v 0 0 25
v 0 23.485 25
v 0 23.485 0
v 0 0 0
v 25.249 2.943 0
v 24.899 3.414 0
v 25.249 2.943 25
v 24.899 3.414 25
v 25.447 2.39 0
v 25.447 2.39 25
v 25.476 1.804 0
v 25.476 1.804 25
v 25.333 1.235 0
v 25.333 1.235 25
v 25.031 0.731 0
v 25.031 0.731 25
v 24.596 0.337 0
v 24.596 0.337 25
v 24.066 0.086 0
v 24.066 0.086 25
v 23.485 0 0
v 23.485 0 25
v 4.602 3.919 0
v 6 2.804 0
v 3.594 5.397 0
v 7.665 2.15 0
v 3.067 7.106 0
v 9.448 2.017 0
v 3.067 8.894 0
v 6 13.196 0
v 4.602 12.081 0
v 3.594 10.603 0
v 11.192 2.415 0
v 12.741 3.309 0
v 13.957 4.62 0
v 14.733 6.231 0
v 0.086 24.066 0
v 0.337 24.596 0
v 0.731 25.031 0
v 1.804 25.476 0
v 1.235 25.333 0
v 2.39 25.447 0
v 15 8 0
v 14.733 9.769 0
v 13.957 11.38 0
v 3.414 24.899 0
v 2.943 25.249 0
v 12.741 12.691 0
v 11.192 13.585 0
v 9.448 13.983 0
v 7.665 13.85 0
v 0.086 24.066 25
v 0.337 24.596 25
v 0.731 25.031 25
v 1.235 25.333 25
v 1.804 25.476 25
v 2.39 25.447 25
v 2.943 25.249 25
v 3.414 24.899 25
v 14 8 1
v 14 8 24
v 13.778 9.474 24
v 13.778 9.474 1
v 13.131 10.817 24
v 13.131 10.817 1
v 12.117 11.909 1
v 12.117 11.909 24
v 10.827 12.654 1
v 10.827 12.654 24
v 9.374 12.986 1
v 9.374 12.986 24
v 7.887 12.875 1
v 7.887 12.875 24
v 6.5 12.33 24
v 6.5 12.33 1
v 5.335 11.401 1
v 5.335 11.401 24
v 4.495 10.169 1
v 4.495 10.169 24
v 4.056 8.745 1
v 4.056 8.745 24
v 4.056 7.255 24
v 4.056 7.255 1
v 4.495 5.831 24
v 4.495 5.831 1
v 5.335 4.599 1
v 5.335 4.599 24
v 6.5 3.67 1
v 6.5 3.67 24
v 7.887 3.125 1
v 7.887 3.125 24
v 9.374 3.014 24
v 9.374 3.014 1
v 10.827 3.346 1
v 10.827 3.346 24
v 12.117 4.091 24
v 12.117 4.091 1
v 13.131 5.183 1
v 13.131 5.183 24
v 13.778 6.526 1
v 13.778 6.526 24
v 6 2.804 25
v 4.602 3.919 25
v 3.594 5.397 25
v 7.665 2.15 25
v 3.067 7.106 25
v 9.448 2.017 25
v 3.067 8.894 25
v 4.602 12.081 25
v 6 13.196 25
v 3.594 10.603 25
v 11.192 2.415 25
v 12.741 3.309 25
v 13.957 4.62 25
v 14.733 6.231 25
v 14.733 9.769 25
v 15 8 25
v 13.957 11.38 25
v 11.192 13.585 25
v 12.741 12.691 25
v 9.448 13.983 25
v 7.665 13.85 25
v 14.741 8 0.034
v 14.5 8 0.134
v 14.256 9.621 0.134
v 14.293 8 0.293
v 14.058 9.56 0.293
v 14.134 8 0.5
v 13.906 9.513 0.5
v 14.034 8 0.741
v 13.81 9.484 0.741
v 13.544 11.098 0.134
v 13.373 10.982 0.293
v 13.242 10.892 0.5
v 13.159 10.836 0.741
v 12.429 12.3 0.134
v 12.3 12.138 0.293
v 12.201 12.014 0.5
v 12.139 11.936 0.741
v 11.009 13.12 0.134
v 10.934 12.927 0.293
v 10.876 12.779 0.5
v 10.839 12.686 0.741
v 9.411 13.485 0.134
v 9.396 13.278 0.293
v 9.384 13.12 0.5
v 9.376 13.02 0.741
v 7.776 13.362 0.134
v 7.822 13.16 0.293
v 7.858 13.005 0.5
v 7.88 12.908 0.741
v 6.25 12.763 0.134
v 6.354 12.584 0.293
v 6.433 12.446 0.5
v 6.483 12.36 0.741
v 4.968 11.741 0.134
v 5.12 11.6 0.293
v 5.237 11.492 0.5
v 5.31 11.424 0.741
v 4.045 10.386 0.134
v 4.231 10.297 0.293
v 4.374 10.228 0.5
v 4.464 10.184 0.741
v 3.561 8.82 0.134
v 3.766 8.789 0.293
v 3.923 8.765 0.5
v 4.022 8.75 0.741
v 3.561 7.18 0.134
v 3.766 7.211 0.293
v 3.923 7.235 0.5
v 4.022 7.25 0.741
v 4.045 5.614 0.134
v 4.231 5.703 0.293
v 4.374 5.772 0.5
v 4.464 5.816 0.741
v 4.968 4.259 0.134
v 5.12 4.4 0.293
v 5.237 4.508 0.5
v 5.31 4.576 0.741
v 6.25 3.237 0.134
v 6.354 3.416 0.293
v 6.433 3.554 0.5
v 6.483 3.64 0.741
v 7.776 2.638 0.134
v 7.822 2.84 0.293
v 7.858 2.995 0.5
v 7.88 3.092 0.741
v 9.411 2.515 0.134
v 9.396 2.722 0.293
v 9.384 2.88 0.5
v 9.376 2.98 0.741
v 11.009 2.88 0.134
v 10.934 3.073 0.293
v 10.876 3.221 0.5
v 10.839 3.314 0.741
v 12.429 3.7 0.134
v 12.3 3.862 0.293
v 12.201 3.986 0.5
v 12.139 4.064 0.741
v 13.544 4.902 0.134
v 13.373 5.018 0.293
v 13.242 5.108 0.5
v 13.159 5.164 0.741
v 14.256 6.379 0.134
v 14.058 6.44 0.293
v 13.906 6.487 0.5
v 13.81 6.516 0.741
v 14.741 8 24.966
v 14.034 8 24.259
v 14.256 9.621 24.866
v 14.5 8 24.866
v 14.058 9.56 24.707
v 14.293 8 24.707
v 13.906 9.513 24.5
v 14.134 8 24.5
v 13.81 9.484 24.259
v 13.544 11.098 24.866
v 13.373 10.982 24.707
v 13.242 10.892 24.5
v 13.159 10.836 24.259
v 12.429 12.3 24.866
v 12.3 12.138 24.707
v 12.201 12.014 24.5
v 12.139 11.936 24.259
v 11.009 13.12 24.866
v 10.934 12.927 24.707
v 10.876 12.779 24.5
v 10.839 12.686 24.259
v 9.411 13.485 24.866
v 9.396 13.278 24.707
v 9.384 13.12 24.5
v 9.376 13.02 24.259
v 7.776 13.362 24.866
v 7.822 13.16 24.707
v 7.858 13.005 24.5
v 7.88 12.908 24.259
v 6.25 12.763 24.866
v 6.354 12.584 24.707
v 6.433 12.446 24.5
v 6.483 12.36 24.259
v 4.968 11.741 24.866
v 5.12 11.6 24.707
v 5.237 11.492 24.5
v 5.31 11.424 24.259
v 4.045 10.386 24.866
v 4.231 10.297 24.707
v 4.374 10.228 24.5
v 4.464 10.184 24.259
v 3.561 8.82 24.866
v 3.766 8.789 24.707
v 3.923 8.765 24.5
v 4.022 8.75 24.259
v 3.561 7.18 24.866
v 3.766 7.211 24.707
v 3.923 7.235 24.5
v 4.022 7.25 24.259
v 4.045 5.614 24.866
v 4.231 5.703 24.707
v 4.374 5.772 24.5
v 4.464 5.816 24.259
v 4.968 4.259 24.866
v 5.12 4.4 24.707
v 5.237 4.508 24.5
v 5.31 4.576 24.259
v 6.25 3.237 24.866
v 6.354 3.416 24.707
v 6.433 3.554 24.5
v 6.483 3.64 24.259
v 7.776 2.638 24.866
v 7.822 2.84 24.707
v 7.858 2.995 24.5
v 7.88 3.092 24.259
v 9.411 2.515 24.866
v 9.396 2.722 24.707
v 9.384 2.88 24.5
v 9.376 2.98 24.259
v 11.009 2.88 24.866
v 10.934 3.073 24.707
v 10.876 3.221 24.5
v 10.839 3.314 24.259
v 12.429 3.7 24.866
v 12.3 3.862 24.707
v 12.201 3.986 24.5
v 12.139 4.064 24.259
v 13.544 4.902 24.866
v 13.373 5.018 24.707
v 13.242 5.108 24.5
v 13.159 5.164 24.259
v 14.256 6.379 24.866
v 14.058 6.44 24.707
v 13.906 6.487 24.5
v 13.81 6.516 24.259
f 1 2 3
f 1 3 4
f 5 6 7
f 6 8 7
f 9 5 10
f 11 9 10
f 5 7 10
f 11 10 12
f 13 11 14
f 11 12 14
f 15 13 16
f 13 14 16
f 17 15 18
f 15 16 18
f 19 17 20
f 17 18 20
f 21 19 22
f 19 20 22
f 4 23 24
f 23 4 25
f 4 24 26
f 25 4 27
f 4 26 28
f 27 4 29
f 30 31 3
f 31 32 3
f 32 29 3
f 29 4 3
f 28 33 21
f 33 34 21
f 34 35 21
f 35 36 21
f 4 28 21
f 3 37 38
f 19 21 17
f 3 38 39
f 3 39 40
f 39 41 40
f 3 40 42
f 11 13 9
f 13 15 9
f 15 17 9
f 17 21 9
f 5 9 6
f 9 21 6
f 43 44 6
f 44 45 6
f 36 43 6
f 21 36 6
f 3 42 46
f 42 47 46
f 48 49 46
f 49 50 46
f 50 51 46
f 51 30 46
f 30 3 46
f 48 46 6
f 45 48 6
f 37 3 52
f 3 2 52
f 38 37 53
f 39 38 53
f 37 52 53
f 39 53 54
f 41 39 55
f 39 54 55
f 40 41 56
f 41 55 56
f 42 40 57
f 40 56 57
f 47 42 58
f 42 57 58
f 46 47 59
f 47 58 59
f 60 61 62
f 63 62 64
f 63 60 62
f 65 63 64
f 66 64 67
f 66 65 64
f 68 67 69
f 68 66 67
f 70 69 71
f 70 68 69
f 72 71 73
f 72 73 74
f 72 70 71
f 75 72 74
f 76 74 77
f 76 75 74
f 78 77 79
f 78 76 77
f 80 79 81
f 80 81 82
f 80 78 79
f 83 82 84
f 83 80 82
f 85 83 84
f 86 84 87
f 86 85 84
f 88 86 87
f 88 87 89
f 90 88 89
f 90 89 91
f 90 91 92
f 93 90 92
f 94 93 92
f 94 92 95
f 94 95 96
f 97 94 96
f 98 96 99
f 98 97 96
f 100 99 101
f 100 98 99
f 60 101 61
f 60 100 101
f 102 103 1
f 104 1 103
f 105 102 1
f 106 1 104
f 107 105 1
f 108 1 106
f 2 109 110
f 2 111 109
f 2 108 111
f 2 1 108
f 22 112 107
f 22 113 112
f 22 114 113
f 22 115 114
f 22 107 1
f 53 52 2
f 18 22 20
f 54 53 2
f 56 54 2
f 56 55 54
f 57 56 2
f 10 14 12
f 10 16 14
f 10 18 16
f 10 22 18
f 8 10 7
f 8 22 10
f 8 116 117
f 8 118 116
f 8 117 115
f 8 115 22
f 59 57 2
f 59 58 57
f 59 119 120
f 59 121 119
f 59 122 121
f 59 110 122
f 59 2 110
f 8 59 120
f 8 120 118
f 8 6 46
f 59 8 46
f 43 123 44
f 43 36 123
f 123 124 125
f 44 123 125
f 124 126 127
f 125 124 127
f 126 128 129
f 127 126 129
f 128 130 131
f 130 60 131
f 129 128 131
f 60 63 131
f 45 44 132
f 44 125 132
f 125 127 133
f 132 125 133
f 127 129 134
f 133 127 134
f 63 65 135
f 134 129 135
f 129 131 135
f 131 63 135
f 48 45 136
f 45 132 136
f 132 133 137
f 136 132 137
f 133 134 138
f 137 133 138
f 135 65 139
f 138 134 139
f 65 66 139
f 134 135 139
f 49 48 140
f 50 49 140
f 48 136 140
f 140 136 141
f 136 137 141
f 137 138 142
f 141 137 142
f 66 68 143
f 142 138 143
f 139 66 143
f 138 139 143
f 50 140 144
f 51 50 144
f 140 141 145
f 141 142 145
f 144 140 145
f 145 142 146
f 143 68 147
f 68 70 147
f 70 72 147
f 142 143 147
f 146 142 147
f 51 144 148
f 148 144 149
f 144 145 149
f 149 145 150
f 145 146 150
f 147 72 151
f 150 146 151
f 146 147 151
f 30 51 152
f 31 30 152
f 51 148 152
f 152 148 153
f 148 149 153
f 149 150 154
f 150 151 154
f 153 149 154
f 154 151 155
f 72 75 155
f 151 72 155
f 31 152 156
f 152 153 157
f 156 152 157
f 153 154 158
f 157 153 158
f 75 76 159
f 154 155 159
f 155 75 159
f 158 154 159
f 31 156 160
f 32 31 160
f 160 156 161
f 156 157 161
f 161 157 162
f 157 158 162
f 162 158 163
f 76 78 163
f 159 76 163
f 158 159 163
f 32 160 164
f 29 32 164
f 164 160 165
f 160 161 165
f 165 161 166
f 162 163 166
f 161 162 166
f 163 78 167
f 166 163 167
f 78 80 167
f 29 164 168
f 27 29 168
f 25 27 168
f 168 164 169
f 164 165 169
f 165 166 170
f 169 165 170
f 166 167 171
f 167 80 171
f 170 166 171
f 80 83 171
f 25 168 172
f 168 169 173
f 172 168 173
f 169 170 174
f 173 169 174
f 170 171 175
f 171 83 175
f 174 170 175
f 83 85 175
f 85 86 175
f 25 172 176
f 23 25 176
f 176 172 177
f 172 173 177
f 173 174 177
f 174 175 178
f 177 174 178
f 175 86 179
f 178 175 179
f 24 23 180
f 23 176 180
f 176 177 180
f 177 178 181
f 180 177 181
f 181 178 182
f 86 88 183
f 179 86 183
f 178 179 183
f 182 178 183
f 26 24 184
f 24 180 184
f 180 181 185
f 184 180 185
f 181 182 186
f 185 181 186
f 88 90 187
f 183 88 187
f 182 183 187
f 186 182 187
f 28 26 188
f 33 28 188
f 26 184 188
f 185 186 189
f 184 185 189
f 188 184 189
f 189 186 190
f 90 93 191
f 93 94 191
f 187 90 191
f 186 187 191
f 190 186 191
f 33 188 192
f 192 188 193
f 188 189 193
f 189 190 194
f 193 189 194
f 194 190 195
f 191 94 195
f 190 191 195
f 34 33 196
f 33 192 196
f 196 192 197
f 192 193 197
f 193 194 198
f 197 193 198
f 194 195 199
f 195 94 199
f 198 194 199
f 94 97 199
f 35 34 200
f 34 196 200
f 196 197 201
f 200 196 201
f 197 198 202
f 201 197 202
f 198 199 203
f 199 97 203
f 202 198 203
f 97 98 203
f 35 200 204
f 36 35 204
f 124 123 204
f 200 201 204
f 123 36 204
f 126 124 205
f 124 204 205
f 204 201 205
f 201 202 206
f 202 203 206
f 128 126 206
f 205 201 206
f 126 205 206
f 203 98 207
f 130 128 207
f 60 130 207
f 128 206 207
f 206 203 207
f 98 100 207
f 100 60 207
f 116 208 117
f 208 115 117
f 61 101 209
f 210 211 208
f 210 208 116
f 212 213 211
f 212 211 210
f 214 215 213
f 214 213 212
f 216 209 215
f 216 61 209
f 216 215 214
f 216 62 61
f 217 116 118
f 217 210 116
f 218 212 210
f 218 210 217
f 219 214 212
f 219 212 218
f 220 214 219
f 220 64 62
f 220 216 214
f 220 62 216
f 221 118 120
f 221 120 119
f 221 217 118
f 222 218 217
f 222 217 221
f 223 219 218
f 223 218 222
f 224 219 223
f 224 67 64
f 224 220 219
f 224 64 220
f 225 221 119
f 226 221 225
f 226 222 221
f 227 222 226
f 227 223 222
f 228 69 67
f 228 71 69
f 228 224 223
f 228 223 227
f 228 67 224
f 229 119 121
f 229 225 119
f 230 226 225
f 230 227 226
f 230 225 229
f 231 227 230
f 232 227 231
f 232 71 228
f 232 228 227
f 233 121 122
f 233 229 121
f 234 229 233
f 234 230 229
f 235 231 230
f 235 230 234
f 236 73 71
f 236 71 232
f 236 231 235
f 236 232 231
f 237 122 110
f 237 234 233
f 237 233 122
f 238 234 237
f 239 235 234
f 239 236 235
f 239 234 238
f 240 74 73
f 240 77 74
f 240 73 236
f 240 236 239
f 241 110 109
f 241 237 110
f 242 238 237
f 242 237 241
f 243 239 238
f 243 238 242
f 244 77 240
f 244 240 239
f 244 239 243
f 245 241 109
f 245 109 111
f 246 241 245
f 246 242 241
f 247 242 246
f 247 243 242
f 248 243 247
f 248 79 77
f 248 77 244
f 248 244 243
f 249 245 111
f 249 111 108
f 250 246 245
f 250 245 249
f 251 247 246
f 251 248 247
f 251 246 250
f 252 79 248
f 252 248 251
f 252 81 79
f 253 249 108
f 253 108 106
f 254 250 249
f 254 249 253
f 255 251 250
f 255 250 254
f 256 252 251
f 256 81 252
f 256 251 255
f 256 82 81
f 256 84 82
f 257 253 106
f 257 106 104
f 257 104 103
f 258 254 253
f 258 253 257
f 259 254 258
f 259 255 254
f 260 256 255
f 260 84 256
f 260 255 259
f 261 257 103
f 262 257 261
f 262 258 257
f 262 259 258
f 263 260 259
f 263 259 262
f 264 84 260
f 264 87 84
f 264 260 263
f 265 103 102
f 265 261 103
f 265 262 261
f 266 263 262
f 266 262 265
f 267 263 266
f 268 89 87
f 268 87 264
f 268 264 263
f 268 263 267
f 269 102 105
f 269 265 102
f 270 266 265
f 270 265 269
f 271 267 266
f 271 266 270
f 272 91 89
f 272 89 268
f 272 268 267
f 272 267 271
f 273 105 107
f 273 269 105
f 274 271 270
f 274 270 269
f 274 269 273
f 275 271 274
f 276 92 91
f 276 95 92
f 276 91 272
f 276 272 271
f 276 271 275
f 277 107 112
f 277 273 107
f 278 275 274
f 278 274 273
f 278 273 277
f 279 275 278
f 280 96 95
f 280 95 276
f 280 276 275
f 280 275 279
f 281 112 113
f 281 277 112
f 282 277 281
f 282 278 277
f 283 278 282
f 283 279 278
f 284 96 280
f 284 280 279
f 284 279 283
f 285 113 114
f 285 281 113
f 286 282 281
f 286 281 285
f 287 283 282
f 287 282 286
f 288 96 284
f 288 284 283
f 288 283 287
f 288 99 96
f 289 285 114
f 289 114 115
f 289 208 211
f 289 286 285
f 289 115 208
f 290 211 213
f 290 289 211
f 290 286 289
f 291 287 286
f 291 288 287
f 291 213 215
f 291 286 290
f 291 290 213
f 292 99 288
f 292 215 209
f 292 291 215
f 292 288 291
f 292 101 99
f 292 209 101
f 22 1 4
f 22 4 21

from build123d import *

# Parameters (mm, degrees)
F0_R     = 5
F1_DEPTH = 25
F2_R     = 2
F3_R     = 1


with BuildPart() as f1:
    # F0 (on Top) → F1 (new body)
    with BuildSketch(Plane.XY):
        Polygon((0, 28.313708), (0, 0), (28.313708, 0), align=None)
        with Locations((9, 8)):
            Circle(F0_R, mode=Mode.SUBTRACT)
    extrude(amount=F1_DEPTH)

    # F2
    f2_edges = [f1.edges().sort_by_distance(p)[0] for p in [
        (0, 28.313708, 12.5),
        (28.313708, 0, 12.5),
    ]]
    fillet(f2_edges, radius=F2_R)

    # F3
    f3_edges = [f1.edges().sort_by_distance(p)[0] for p in [
        (14, 8, 12.5),
        (4, 8, 0),
        (4, 8, 25),
    ]]
    fillet(f3_edges, radius=F3_R)


solid = f1.part
